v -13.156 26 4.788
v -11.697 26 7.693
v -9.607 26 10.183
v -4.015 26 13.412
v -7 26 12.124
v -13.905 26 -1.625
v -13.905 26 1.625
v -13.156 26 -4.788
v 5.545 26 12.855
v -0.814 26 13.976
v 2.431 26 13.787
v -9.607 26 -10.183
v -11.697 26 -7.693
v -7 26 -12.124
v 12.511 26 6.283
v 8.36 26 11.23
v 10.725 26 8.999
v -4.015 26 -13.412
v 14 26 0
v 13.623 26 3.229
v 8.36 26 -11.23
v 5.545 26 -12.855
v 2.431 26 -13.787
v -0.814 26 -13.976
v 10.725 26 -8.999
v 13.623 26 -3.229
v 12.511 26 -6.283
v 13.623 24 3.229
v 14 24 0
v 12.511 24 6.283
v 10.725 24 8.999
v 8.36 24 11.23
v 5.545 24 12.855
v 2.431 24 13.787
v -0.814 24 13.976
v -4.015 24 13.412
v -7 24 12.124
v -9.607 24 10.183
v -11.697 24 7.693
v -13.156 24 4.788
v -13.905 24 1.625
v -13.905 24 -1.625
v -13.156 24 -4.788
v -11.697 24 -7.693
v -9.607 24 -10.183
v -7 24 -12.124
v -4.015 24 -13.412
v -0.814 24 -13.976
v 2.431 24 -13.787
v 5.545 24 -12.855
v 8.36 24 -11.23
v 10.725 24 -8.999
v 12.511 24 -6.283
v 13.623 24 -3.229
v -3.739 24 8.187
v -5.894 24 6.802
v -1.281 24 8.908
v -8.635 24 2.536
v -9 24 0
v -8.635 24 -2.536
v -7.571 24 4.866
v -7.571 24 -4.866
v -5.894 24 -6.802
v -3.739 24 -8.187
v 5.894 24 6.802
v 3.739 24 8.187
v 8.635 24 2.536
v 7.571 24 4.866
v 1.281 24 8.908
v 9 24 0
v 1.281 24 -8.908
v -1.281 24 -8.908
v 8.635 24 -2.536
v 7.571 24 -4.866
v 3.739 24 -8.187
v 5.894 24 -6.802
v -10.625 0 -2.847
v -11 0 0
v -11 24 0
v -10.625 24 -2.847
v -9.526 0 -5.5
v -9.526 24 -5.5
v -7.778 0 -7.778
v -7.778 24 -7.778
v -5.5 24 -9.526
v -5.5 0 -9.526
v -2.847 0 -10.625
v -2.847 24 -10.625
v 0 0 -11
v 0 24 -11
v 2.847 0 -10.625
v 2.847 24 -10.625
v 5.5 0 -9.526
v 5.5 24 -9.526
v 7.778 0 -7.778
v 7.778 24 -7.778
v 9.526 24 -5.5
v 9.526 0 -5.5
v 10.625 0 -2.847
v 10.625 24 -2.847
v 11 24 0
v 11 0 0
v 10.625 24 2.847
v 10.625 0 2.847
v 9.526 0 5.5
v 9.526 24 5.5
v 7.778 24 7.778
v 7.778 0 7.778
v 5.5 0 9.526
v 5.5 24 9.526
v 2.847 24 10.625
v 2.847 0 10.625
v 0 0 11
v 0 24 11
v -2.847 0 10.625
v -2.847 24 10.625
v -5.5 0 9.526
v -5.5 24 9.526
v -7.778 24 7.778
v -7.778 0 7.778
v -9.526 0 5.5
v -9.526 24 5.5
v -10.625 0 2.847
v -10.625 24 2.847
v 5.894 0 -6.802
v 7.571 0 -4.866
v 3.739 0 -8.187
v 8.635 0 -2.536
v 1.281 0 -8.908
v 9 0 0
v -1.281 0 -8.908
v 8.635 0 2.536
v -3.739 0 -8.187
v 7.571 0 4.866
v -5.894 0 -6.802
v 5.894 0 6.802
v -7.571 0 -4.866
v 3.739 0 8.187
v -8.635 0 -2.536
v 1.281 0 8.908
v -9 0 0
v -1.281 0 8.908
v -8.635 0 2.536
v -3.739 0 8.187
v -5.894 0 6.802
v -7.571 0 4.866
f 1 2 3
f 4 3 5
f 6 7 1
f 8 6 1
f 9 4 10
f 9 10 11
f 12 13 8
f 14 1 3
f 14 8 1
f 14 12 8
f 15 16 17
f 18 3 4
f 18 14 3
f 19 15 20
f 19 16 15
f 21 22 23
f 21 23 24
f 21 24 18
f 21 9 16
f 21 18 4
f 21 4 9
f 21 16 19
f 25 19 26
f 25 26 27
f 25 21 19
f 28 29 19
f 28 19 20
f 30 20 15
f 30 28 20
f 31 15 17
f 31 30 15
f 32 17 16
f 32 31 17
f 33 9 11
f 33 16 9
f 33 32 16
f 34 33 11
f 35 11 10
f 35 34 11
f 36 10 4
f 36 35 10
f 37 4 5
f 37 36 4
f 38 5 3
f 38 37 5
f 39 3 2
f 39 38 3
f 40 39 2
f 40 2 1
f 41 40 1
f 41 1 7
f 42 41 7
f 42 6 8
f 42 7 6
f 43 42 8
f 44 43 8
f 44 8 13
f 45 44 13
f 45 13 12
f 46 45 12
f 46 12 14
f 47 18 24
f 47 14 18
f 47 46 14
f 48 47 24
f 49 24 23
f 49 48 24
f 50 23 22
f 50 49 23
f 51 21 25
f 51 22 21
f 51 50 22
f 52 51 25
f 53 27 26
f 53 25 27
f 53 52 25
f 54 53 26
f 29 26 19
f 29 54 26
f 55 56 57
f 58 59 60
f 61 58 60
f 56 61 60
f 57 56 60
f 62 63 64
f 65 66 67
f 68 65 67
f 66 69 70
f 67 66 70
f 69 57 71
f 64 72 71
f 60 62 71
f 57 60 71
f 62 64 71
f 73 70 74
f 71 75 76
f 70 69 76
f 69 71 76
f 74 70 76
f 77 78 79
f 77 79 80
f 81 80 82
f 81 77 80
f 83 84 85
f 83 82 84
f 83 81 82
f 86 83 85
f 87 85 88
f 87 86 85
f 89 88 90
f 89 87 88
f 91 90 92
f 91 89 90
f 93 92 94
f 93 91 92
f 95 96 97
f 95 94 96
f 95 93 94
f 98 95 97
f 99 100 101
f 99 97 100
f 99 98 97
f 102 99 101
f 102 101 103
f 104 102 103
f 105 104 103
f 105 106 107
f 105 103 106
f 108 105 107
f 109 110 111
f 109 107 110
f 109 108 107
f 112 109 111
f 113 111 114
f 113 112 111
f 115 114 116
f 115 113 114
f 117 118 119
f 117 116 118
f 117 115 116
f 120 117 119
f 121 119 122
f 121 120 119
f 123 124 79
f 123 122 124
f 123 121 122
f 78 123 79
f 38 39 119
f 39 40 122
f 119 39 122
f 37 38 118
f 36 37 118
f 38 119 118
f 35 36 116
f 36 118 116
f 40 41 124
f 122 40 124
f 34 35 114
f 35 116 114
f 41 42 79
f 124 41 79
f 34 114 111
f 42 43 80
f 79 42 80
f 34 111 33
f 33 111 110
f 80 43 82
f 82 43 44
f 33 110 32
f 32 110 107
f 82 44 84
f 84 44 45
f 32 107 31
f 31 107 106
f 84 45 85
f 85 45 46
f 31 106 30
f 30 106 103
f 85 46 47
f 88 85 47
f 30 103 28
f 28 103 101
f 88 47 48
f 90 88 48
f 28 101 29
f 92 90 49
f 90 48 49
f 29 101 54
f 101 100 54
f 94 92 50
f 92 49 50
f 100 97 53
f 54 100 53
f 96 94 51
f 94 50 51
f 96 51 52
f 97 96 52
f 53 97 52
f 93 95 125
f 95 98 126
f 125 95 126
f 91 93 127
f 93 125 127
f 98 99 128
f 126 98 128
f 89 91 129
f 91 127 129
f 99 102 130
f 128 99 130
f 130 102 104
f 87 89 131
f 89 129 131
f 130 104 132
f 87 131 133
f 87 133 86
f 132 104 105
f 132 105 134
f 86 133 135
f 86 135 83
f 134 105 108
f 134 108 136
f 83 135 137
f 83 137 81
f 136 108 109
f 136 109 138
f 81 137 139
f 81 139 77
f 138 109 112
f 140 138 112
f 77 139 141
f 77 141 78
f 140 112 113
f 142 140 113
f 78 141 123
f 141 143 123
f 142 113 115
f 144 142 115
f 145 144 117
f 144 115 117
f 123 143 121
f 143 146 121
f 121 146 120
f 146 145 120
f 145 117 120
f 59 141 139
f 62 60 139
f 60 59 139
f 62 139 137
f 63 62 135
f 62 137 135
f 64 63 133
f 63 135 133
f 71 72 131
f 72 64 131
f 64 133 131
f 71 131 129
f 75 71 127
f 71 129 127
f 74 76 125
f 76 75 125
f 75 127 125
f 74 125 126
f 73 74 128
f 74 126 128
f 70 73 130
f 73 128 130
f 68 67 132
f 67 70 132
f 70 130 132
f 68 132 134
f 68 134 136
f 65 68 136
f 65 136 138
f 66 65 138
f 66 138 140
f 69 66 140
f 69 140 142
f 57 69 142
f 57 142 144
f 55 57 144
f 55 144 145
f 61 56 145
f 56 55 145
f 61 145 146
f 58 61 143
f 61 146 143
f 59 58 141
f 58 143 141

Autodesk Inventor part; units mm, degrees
ref_plane "YZ Plane" through (0, 0, 0) normal (1, 0, 0) x (0, 1, 0)
ref_plane "XZ Plane" through (0, 0, 0) normal (0, 1, 0) x (-1, 0, 0)
ref_plane "XY Plane" through (0, 0, 0) normal (0, 0, 1) x (1, 0, 0)
sketch "Szkic1" plane through (0, 0, 0) normal (0, 1, 0) x (-1, 0, 0)
  circle A0 centre (0, 0) radius 11
  circle A1 centre (0, 0) radius 9
  dimension "d0" = 22
  dimension "d1" = 2
extrude "Wyciągnięcie proste1" add sketch "Szkic1" along normal blind 24
sketch "Szkic2" plane through (0, 24, 0) normal (0, 1, 0) x (1, 0, 0)
  circle A0 centre (0, 0) radius 14
  circle A1 centre (0, 0) radius 11 projected
  dimension "d4" = 28
  dimension "d7" = 3
extrude "Wyciągnięcie proste2" add sketch "Szkic2" along normal blind 2 contours A0 | A1
properties part number "tuleja"
